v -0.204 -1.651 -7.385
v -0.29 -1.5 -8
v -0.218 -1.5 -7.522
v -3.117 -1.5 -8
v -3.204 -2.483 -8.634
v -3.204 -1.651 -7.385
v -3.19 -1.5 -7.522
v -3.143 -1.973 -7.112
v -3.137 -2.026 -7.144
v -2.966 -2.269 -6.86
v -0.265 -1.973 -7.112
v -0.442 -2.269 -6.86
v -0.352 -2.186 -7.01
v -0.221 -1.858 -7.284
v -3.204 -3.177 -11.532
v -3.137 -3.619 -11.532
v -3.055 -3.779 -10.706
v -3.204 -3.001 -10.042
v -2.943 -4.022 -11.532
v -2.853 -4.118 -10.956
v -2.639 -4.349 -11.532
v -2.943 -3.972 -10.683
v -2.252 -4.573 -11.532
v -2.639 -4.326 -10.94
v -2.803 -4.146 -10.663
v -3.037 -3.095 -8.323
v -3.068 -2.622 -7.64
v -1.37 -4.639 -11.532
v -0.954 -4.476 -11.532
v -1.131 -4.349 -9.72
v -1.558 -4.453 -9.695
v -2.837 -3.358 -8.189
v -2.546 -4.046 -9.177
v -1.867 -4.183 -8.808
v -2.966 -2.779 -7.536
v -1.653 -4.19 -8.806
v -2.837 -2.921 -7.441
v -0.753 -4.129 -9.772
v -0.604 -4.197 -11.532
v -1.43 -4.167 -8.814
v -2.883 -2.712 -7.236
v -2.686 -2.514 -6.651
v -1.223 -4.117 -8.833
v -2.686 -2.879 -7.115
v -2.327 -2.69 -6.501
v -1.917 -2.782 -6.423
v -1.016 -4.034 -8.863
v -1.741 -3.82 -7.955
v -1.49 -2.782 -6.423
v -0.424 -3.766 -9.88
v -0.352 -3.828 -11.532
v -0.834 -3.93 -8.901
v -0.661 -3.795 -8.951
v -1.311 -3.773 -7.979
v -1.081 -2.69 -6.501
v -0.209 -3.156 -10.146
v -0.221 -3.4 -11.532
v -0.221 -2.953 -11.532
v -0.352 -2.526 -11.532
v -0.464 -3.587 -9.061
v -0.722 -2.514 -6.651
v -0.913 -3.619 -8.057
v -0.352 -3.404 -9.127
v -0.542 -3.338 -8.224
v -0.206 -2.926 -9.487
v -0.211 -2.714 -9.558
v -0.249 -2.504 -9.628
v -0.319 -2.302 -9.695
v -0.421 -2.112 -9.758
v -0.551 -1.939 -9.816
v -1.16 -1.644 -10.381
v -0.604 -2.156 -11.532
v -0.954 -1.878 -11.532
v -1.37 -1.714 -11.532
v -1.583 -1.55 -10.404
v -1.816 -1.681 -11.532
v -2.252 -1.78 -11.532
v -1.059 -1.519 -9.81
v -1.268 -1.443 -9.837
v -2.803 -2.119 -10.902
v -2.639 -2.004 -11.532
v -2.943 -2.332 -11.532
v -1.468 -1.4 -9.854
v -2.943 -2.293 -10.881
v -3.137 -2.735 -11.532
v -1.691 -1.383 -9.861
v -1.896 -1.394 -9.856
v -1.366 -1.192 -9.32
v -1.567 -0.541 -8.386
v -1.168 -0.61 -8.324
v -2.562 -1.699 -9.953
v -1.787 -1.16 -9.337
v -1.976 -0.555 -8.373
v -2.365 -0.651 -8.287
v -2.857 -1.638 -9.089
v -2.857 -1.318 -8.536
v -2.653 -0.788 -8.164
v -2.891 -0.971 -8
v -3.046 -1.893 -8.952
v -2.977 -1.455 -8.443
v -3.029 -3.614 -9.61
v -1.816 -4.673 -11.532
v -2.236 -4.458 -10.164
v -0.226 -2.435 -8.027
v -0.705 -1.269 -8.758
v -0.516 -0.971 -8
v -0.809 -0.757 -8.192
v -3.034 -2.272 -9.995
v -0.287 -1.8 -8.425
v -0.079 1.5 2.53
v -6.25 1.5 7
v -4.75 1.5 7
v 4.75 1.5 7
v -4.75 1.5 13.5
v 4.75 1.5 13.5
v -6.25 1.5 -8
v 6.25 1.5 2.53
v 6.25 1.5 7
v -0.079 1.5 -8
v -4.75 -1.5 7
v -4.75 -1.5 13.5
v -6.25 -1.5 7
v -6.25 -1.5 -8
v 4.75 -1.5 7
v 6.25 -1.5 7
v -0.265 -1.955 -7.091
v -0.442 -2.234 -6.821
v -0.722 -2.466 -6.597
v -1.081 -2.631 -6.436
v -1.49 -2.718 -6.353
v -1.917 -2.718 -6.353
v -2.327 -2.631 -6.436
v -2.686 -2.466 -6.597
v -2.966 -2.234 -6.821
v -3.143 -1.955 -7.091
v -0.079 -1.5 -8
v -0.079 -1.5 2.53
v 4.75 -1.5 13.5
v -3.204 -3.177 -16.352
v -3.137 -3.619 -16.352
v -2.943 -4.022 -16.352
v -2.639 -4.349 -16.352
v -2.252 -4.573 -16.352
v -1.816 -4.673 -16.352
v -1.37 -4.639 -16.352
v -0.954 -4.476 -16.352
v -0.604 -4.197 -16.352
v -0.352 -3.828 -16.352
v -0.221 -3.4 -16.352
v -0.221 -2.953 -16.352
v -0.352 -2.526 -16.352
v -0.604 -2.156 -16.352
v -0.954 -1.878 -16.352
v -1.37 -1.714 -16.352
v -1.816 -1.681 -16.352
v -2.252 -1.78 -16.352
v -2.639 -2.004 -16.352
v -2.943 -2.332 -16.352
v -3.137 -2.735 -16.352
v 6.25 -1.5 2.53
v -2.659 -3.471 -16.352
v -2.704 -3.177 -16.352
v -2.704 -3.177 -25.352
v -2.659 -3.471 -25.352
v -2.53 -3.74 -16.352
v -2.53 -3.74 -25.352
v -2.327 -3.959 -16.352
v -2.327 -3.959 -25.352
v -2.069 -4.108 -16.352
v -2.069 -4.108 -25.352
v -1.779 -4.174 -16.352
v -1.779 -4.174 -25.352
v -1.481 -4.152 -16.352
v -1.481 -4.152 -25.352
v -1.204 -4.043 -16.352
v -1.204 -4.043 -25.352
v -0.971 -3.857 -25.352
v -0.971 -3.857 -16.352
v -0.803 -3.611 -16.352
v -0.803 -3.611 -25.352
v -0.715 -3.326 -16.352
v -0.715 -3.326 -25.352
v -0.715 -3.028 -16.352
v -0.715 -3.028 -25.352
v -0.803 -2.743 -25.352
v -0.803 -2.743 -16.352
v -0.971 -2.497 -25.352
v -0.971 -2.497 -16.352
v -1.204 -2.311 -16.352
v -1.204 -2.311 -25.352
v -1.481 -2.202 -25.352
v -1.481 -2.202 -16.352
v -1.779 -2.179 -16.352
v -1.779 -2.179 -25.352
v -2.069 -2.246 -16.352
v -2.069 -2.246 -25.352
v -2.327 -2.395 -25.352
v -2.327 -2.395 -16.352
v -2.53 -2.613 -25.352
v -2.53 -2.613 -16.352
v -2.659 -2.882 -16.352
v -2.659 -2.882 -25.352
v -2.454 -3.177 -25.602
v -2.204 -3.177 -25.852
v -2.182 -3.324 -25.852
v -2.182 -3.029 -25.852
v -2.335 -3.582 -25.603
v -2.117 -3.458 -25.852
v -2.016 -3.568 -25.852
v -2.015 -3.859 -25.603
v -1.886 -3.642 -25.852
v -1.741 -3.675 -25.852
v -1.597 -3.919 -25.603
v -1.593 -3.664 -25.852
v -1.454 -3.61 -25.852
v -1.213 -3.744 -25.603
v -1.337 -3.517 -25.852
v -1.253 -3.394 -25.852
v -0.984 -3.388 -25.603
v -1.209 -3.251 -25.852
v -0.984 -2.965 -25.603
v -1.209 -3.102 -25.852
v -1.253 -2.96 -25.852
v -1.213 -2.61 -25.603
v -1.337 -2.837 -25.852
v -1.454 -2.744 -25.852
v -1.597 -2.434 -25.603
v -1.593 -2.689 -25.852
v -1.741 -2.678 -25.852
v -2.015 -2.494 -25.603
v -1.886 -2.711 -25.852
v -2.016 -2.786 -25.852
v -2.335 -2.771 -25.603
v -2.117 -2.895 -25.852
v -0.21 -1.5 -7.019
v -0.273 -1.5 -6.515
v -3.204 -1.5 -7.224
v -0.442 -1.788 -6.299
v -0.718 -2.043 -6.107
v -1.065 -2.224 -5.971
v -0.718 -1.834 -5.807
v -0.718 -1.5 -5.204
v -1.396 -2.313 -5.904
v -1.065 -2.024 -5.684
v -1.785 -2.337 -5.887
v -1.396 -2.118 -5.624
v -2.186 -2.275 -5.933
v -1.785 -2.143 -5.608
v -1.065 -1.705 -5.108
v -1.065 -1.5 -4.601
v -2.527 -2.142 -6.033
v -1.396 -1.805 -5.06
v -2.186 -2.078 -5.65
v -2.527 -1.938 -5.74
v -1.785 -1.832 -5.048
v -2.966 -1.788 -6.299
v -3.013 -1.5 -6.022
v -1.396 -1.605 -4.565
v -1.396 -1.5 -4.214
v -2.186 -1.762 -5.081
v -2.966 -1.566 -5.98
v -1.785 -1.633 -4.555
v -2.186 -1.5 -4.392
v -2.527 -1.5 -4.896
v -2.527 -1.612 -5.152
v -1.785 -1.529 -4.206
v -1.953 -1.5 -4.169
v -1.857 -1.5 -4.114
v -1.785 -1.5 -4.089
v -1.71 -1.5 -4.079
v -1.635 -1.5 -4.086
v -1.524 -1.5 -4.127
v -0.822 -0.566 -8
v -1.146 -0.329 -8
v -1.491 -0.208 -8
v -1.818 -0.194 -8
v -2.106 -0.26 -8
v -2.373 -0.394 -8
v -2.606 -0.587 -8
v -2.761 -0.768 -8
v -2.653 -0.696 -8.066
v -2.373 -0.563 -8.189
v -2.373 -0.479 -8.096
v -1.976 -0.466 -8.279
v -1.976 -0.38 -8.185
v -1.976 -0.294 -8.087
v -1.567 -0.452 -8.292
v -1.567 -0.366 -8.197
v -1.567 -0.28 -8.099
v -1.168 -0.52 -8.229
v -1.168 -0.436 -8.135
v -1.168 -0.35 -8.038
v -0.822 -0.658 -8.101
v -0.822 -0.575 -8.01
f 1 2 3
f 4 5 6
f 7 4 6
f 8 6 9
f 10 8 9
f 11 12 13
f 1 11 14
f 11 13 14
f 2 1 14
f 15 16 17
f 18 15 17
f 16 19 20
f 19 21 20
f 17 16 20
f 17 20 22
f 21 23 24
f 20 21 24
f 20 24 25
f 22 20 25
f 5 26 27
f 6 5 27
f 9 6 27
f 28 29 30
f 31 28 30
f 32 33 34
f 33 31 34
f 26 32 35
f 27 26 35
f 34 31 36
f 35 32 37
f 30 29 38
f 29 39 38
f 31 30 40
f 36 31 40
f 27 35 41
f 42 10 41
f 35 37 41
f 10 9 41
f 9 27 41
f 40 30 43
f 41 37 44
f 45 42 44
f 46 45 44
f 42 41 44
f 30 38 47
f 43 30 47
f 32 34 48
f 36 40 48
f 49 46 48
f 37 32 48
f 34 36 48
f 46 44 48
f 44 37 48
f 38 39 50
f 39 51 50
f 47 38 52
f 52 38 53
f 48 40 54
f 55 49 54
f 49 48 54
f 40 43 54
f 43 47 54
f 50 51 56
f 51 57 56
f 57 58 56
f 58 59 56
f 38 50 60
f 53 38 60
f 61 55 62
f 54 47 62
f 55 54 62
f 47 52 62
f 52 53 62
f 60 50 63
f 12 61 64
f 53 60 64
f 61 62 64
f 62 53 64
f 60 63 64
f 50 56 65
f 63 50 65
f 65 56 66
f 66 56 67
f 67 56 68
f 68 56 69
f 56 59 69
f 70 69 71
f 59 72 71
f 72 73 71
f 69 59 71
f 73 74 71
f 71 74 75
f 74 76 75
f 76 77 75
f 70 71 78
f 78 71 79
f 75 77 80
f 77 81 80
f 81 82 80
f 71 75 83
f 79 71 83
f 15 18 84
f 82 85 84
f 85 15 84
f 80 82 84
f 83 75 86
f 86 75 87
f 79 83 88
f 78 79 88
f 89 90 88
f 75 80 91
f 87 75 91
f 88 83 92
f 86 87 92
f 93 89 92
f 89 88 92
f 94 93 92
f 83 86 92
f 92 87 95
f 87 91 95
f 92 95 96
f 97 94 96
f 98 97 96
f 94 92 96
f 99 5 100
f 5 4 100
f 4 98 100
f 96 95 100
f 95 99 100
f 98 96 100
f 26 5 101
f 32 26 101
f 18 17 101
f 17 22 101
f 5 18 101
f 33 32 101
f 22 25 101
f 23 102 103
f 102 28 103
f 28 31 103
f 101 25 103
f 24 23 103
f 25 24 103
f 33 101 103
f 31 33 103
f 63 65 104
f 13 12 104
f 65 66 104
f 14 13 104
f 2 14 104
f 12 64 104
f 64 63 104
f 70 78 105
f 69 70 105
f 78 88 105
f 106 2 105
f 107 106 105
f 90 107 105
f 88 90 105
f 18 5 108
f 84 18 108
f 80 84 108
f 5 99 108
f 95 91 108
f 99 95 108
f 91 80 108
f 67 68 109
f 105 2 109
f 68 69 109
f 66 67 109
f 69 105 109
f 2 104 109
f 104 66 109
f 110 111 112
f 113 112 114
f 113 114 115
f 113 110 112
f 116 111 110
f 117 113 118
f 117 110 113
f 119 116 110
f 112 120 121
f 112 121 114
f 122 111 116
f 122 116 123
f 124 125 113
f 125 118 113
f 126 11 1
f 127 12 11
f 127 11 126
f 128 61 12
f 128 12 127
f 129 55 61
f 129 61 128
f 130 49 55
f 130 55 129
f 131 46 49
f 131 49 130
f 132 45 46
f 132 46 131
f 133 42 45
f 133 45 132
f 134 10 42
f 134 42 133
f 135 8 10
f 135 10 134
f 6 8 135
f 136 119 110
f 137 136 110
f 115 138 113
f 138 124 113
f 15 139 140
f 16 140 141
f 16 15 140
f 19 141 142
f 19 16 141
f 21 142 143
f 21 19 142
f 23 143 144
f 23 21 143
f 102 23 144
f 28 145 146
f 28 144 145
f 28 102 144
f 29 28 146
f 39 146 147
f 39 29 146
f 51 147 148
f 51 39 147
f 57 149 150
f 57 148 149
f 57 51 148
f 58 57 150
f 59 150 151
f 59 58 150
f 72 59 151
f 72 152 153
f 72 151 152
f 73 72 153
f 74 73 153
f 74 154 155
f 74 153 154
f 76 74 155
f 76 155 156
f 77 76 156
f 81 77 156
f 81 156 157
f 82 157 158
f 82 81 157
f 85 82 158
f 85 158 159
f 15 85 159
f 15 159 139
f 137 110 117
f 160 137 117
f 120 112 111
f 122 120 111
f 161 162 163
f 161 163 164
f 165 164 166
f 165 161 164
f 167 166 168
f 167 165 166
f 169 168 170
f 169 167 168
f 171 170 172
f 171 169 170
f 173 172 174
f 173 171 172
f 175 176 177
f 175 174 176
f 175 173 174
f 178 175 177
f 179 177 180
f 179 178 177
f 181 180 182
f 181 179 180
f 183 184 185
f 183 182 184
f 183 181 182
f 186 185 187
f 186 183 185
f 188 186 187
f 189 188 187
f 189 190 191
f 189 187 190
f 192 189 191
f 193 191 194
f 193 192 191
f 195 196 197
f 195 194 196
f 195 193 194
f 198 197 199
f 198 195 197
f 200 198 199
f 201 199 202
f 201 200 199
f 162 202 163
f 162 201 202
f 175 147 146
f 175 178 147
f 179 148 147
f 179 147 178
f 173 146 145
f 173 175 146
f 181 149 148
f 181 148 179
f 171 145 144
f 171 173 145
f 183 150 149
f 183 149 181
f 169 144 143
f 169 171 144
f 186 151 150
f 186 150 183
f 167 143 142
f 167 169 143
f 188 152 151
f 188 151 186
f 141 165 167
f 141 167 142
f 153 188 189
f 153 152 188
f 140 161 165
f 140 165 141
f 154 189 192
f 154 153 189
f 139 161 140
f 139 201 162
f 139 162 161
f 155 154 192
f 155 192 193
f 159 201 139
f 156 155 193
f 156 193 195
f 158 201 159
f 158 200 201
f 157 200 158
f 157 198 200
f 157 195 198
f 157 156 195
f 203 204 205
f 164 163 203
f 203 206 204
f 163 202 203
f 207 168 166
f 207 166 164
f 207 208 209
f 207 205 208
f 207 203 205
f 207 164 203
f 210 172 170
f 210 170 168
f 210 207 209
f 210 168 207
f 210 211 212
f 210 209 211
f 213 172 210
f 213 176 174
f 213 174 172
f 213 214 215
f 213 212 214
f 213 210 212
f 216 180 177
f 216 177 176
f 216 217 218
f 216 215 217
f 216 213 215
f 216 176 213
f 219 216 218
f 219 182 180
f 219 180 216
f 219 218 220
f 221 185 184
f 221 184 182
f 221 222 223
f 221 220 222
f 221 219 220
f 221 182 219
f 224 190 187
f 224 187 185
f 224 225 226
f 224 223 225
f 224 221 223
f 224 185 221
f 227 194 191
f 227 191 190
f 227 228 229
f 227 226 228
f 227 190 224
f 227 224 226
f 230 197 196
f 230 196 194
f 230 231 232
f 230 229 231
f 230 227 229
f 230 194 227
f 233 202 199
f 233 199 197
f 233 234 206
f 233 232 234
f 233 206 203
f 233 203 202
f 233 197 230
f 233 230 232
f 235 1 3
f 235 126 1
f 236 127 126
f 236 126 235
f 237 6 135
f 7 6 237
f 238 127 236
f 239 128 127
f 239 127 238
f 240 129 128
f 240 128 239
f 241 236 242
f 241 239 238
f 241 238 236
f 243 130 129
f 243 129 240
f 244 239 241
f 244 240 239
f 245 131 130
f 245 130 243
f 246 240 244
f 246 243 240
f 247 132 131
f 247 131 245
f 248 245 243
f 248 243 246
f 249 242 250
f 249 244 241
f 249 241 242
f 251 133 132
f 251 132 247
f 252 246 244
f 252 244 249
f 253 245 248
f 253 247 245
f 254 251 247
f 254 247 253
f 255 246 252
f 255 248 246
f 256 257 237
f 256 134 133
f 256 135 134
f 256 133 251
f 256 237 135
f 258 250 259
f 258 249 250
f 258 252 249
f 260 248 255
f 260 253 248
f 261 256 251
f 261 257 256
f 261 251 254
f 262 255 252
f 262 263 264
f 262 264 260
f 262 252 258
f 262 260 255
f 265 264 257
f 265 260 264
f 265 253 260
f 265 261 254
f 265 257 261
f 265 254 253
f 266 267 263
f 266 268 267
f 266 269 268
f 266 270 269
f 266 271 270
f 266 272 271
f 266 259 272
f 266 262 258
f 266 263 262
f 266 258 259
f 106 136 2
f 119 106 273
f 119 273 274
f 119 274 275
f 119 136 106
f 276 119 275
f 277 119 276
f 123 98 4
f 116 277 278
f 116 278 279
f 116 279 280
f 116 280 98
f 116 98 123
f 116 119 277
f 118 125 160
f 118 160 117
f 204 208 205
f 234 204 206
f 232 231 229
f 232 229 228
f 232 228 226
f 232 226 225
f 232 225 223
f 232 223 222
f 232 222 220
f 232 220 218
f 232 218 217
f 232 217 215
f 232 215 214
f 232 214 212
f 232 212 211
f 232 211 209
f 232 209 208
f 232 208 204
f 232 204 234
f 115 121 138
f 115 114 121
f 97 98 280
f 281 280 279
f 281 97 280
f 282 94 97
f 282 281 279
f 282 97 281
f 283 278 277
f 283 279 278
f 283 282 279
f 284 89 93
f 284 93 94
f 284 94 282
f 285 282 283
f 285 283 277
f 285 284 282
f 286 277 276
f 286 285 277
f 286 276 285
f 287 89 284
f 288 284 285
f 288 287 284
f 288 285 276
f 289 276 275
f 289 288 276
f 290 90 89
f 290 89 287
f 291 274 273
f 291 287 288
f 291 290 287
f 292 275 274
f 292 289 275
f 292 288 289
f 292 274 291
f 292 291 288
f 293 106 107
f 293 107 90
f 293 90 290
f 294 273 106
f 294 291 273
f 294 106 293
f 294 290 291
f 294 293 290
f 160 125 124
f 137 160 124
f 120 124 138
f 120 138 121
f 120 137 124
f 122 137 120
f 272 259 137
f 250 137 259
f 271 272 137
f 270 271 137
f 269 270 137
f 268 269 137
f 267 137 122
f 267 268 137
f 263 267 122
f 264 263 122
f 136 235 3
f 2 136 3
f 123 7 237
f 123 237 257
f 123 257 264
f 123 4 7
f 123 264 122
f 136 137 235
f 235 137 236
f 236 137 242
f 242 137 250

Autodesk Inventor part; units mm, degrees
ref_plane "YZ Plane" through (0, 0, 0) normal (1, 0, 0) x (0, 1, 0)
sketch "草图1" plane through (0, 0, 0) normal (0, 0, 1) x (1, 0, 0)
  line L0 (4.75, -1.5) -> (-4.75, -1.5)
  line L1 (-4.75, -1.5) -> (-4.75, 1.5)
  line L2 (-4.75, 1.5) -> (4.75, 1.5)
  line L3 (4.75, 1.5) -> (4.75, -1.5)
  line L4 (4.75, -1.5) -> (-4.75, 1.5) construction
  line L5 (-4.75, -1.5) -> (4.75, 1.5) construction
  circle A0 centre (0, 0) radius 1
  dimension "d0" = 3
  dimension "d1" = 2
  dimension "d2" = 9.5
extrude "拉伸1" add sketch "草图1" along normal blind 3
sketch "草图2" plane through (0, 0, 3) normal (0, 0, 1) x (1, 0, 0)
  line L0 (4.75, 1.5) -> (-4.75, 1.5) projected
  line L1 (-4.75, 1.5) -> (-4.75, -1.5) projected
  line L2 (-4.75, -1.5) -> (4.75, -1.5) projected
  line L3 (4.75, -1.5) -> (4.75, 1.5) projected
  circle A0 centre (0, 0) radius 1 projected
extrude "拉伸2" add sketch "草图2" along normal blind 10 contours L3 L2 L1 L0 | A0
sketch "草图3" plane through (-4.75, 1.5, 0) normal (0, 1, 0) x (1, 0, 0)
  line L0 (-1.5, 0) -> (11, 0)
  line L1 (11, 0) -> (11, -7)
  line L2 (11, -7) -> (-1.5, -7)
  line L3 (-1.5, -7) -> (-1.5, 0)
  line L4 (9.5, 0) -> (9.5, -13) projected
  line L5 (0, 0) -> (0, -13) projected
  line L6 (9.5, 0) -> (0, 0) projected
  point P0 (4.75, 0)
  point P1 (-1.5, -3.5)
  point P2 (9.5, -7)
  point P3 (0, -7)
  dimension "d8" = 1.5
  dimension "d9" = 1.5
  dimension "d15" = 7
extrude "拉伸3" add sketch "草图3" against normal blind 3
move faces "移动1" translate (0, 0, 2) faces at (1.5833, 0.5, 13)
sketch "草图4" plane through (0, 0, 0) normal (0, 0, -1) x (-1, 0, 0)
  circle A0 centre (0, 0) radius 1.5
  dimension "d16" = 3
extrude "拉伸4" add sketch "草图4" along normal blind 0.5
ref_plane "工作平面1" through (11.9199, 26.93, -22.8525) normal (0, 0, 1) x (-1, 0, 0)
sketch "草图5" plane through (11.9199, 26.93, -22.8525) normal (0, 0, 1) x (-1, 0, 0)
  circle A0 centre (13.6237, 30.1067) radius 1.5
  circle A1 centre (13.716, 24.2534) radius 1.5
  circle A2 centre (13.6237, 30.1067) radius 1.5
  point P0 (11.9199, 26.93)
  dimension "d19" = 3
sketch "草图7" plane through (0, 0, -0.5) normal (0, 0, -1) x (-1, 0, 0)
  circle A0 centre (0, 0) radius 1.5 projected
ref_plane "工作平面2" through (11.9199, 26.93, -12.8525) normal (0, 0, 1) x (-1, 0, 0)
sketch "草图8" plane through (11.9199, 26.93, -12.8525) normal (0, 0, 1) x (-1, 0, 0)
  circle A0 centre (12.3625, 23.27) radius 1.5
  point P0 (11.9199, 26.93)
sketch "草图9" plane through (0, 0, 0) normal (1, 0, 0) x (0, 1, 0)
  line L0 (-4.6767, -22.8525) -> (-1.6767, -22.8525) projected
  line L1 (-3.1767, -22.8525) -> (-3.1767, -11.5324)
  arc A0 (-1.651, -7.3854) -> (-3.1767, -11.5324) centre (3.2225, -11.5324) ccw
  arc A1 (-1.651, -7.3854) -> (0.0125, -4.1729) centre (-6.1762, -3.0051) ccw
  point P0 (-3.6148, -22.5313)
  point P1 (-2.7659, -4.1729)
sweep "扫掠1" add profiles "草图5" path "草图9" path curves L1 A0 A1 contours A0
loft "放样1" add section 1 edges at (1.5, 0, -0.5) section 2 edges at (-0.2038, 0.0125, -4.1729)
sketch "草图15" plane through (0, 0, 0) normal (0, 0, -1) x (-1, 0, 0)
  line L0 (-6.25, 1.5) -> (0, 1.5) projected
  line L1 (4.75, -1.5) -> (6.25, -1.5) projected
  line L2 (-6.25, 1.5) -> (6.25, 1.5)
  line L3 (6.25, 1.5) -> (6.25, -1.5)
  line L4 (6.25, -1.5) -> (-6.25, -1.5)
  line L5 (-6.25, -1.5) -> (-6.25, 1.5)
  point P0 (0, 0)
  point P1 (0, 1.5)
extrude "拉伸9" add sketch "草图15" along normal blind 8
sketch "草图16" plane through (4.75, 1.5, 7) normal (0, 1, 0) x (1, 0, 0)
  line L0 (1.5, 15) -> (-11, 15) projected
  line L1 (1.5, 15) -> (-4.829, 15)
  line L2 (-4.829, 15) -> (-4.829, 4.4703)
  line L3 (-4.829, 4.4703) -> (1.5, 4.4703)
  line L4 (1.5, 4.4703) -> (1.5, 15)
  point P0 (-4.75, 7)
extrude "拉伸10" cut sketch "草图16" against normal blind 6.75
sketch "草图17" plane through (-1.7038, -3.1767, -22.8525) normal (0, 0, -1) x (-1, 0, 0)
  circle A0 centre (0, 0) radius 1.5 projected
  circle A1 centre (0, 0) radius 1
  point P0 (-1.7038, 3.1767)
  dimension "d46" = 2
ref_plane "工作平面3" through (0.201, 1.0367, -16.3525) normal (0, 0, -1) x (0, 1, 0)
extrude "拉伸11" cut sketch "草图17" against normal up to surface (6.5 mm away)
sketch "草图18" plane through (-1.7038, -3.1767, -16.3525) normal (0, 0, -1) x (-1, 0, 0)
  circle A0 centre (0, 0) radius 1 projected
  point P0 (-1.7038, 3.1767)
extrude "拉伸12" add sketch "草图18" along normal blind 9.5
chamfer "倒角2" distance 0.5 angle 45 1 edges at (-0.7038, -3.1767, -25.8525)
offset faces "大小2" outward -3.5 faces at (1.5833, -0.5, 15)
offset faces "大小3" outward 2 faces at (1.5833, -0.5, 11.5)
properties part number "轴系按钮2"
